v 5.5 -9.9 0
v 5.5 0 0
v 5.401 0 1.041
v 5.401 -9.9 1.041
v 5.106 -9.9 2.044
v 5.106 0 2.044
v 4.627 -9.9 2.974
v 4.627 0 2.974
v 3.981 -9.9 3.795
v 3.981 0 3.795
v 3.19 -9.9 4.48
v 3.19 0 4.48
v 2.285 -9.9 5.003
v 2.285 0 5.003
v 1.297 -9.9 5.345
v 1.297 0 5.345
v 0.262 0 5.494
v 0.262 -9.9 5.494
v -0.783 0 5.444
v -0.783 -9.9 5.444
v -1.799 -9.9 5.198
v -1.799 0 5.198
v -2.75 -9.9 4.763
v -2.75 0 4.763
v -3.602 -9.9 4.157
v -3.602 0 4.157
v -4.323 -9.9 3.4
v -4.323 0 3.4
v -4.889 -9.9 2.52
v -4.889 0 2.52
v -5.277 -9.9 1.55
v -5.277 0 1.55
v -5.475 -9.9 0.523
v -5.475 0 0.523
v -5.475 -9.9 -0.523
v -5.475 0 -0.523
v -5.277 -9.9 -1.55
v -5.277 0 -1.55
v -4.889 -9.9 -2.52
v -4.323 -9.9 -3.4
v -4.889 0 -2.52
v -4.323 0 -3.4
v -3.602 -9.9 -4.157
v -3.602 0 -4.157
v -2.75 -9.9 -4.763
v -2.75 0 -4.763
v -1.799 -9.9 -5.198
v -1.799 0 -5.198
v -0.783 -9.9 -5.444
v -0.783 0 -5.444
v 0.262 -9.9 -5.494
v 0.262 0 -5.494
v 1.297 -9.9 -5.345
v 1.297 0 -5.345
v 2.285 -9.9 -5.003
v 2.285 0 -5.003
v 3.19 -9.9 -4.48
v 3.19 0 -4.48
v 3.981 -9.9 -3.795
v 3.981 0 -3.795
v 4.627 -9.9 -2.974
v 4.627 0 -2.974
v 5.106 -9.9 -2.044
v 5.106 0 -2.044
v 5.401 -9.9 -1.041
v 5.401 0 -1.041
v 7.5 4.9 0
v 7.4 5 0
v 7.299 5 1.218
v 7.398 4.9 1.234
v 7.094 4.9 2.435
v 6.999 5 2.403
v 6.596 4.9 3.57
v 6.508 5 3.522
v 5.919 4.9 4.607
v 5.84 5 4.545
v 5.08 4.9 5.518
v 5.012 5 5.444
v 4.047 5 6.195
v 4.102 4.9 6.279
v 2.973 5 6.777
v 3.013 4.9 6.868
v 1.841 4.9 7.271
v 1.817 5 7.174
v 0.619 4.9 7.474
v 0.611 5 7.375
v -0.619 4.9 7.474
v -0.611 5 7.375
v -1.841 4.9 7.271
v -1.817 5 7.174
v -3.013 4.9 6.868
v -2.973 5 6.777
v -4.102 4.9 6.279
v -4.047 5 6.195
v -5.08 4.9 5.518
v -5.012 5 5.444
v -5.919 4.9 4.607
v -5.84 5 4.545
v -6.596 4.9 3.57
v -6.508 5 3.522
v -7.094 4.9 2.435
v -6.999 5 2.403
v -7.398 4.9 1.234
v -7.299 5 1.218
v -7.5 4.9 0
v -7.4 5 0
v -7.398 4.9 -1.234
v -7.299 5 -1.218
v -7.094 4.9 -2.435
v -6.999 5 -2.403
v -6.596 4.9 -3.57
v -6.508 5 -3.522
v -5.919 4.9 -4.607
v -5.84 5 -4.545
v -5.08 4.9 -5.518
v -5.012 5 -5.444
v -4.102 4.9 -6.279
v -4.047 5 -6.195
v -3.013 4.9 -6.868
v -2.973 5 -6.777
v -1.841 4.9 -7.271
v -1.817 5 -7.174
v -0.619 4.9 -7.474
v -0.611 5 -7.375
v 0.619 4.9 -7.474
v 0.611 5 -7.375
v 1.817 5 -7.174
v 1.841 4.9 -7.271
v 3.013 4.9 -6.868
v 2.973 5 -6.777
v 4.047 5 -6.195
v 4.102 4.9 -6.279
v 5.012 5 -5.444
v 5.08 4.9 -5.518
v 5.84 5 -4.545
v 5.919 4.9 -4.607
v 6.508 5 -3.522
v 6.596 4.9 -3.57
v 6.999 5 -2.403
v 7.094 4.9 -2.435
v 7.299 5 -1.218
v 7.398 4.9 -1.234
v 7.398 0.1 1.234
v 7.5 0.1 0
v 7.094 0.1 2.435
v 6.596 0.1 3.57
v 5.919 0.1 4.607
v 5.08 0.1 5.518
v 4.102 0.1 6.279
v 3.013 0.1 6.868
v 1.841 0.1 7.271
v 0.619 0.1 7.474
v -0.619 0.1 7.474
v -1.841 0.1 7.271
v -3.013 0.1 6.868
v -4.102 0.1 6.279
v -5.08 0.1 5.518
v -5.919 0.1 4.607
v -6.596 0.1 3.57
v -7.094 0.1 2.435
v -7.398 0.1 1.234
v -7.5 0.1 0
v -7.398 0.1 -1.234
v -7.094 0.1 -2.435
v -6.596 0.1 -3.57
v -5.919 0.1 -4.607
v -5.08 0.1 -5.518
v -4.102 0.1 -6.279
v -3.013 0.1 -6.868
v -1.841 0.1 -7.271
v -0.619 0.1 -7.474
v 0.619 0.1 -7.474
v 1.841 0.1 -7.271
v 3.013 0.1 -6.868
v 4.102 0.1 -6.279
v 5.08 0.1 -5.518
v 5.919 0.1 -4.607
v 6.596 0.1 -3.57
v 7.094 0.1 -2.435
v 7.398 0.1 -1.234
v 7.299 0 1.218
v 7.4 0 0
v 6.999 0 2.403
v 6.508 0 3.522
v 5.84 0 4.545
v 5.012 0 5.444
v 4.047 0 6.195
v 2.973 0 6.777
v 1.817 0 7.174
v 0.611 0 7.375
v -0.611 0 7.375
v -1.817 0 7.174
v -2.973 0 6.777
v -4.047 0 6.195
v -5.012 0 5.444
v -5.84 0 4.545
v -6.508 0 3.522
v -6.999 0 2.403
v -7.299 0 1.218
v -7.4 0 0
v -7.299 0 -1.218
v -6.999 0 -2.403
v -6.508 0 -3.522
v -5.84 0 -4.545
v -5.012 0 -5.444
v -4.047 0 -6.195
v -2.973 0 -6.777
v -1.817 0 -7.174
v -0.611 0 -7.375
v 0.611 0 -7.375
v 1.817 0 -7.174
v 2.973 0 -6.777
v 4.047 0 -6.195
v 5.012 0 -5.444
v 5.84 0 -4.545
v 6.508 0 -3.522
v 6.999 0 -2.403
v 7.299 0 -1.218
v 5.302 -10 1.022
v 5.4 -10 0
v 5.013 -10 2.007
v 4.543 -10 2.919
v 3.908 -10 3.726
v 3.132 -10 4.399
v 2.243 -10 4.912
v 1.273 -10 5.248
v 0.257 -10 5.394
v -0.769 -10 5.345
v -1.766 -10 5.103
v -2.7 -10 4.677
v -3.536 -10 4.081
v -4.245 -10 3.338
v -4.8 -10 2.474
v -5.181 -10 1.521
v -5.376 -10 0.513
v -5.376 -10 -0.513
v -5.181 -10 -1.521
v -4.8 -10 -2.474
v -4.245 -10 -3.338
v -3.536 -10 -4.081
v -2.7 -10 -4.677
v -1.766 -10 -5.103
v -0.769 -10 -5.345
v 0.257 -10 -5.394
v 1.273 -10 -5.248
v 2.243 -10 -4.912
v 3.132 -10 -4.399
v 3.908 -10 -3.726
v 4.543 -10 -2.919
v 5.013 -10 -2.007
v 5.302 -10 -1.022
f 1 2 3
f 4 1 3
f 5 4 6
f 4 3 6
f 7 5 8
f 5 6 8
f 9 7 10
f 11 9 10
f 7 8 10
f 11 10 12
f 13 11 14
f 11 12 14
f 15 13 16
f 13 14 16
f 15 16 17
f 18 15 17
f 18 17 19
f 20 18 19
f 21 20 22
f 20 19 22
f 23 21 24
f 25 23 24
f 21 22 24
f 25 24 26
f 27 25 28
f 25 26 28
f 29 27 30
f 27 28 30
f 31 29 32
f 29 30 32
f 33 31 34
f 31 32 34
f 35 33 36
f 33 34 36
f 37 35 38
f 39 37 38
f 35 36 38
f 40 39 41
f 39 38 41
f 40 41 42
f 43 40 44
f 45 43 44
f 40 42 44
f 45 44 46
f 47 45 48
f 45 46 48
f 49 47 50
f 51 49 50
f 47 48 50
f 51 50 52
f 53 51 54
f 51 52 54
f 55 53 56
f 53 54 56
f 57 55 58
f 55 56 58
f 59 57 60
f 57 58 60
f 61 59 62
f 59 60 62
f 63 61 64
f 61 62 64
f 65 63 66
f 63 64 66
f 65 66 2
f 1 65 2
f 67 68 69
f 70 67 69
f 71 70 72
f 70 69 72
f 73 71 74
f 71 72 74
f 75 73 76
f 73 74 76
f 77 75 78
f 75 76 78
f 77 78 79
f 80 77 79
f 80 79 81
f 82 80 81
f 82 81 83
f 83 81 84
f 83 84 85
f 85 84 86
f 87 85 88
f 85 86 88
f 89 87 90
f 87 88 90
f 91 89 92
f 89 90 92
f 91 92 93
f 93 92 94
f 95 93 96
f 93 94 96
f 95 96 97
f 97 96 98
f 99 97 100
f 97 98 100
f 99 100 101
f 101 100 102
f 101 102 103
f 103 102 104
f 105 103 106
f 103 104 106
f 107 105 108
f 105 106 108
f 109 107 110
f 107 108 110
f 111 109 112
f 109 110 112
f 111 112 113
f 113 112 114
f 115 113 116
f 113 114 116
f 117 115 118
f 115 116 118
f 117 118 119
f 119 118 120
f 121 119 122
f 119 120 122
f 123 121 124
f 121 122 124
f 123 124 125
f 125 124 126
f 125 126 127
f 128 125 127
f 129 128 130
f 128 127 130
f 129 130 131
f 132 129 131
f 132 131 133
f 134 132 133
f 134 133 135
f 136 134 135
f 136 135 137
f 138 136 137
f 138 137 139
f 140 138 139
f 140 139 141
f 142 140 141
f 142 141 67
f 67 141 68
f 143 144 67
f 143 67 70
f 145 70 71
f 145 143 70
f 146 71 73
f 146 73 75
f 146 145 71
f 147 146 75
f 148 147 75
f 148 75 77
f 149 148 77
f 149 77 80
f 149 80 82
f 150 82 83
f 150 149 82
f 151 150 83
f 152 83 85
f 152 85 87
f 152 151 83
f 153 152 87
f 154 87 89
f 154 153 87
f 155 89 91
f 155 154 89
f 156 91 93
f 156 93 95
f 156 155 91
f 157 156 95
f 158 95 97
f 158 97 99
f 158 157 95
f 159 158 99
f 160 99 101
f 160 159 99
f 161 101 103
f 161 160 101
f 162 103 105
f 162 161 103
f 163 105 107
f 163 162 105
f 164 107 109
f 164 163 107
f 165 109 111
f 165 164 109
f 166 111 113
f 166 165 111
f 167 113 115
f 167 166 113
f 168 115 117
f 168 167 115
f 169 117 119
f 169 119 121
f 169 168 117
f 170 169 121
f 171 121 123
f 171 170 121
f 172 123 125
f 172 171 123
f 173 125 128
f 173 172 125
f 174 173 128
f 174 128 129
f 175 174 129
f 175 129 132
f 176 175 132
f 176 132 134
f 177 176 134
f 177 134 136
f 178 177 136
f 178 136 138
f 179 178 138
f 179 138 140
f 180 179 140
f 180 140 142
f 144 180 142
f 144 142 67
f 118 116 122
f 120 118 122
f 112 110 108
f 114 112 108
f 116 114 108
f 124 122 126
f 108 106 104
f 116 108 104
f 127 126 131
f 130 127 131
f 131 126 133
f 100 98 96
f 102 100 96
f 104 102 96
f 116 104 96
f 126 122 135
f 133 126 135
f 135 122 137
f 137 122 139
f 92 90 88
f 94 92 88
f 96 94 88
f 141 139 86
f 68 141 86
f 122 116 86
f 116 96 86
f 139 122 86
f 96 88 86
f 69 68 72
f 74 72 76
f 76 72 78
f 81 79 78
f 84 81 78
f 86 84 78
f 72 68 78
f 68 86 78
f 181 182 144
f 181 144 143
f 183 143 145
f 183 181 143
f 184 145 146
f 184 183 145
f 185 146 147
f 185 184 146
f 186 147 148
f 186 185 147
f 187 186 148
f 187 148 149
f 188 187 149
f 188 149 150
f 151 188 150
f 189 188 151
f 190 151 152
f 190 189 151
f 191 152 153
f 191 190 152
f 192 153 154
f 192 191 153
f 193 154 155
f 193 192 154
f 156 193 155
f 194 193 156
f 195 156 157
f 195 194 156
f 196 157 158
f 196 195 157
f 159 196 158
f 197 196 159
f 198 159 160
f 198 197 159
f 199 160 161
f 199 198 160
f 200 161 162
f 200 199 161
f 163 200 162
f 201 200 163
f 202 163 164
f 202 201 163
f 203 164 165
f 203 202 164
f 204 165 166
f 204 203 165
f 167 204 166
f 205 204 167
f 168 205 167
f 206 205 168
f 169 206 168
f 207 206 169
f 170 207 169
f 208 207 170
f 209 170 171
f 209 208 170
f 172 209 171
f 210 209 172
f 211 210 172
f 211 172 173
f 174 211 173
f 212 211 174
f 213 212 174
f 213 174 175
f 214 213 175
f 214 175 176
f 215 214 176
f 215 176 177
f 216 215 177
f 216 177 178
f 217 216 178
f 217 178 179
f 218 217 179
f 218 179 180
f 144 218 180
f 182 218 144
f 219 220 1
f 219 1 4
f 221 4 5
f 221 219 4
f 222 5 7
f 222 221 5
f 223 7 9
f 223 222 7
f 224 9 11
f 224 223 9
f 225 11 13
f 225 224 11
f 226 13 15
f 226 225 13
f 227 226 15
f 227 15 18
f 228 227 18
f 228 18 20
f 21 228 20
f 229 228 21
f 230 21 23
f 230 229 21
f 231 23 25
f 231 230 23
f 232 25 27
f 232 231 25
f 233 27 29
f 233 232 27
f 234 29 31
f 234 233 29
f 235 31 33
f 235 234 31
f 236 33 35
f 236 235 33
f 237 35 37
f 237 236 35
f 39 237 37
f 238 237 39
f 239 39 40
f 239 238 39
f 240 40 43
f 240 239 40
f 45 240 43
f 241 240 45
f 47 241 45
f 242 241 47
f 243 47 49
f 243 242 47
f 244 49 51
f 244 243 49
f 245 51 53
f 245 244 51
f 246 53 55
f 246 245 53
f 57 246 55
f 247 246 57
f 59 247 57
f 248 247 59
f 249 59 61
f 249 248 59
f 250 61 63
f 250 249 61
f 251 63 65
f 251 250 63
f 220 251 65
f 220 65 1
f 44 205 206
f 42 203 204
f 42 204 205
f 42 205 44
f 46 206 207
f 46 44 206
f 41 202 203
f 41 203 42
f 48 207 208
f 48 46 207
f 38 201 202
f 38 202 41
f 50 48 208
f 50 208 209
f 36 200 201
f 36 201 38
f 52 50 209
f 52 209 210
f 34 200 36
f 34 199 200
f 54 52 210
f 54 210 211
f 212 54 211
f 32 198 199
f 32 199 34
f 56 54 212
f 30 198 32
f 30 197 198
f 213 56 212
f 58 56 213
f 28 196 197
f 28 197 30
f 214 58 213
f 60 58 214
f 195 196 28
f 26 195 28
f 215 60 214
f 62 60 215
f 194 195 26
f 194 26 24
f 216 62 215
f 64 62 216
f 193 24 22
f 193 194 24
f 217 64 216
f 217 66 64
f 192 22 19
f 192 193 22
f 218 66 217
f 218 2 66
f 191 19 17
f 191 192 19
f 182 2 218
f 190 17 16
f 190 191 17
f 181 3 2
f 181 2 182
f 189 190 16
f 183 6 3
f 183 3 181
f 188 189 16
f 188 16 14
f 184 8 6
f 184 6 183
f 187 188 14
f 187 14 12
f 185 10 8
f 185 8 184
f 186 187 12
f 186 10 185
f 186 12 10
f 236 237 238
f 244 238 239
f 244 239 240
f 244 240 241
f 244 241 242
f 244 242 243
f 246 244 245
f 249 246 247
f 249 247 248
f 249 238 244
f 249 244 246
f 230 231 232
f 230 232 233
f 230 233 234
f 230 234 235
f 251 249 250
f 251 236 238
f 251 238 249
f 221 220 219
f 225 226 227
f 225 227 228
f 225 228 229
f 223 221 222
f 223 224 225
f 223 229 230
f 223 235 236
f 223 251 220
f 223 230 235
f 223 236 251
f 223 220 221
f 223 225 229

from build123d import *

# Parameters (mm, degrees)
F0_R     = 7.5
F0_R_2   = 5.5
F1_DEPTH = 5
F2_DEPTH = 10
F3_SIZE  = 0.1


with BuildPart() as f1:
    # F0 (on Front) → F1 (new body)
    with BuildSketch(Plane.XZ):
        Circle(F0_R)
        Circle(F0_R_2, mode=Mode.SUBTRACT)
        Circle(F0_R_2)
    extrude(amount=-F1_DEPTH)

    # F0 (on Front) → F2 (join)
    with BuildSketch(Plane.XZ):
        Circle(F0_R_2)
    extrude(amount=F2_DEPTH)

    # F3
    f3_edges = [f1.edges().sort_by_distance(p)[0] for p in [
        (-5.5, -10, 0),
        (7.5, 2.5, 0),
        (-7.5, 0, 0),
        (-7.5, 5, 0),
    ]]
    chamfer(f3_edges, length=F3_SIZE)


solid = f1.part
